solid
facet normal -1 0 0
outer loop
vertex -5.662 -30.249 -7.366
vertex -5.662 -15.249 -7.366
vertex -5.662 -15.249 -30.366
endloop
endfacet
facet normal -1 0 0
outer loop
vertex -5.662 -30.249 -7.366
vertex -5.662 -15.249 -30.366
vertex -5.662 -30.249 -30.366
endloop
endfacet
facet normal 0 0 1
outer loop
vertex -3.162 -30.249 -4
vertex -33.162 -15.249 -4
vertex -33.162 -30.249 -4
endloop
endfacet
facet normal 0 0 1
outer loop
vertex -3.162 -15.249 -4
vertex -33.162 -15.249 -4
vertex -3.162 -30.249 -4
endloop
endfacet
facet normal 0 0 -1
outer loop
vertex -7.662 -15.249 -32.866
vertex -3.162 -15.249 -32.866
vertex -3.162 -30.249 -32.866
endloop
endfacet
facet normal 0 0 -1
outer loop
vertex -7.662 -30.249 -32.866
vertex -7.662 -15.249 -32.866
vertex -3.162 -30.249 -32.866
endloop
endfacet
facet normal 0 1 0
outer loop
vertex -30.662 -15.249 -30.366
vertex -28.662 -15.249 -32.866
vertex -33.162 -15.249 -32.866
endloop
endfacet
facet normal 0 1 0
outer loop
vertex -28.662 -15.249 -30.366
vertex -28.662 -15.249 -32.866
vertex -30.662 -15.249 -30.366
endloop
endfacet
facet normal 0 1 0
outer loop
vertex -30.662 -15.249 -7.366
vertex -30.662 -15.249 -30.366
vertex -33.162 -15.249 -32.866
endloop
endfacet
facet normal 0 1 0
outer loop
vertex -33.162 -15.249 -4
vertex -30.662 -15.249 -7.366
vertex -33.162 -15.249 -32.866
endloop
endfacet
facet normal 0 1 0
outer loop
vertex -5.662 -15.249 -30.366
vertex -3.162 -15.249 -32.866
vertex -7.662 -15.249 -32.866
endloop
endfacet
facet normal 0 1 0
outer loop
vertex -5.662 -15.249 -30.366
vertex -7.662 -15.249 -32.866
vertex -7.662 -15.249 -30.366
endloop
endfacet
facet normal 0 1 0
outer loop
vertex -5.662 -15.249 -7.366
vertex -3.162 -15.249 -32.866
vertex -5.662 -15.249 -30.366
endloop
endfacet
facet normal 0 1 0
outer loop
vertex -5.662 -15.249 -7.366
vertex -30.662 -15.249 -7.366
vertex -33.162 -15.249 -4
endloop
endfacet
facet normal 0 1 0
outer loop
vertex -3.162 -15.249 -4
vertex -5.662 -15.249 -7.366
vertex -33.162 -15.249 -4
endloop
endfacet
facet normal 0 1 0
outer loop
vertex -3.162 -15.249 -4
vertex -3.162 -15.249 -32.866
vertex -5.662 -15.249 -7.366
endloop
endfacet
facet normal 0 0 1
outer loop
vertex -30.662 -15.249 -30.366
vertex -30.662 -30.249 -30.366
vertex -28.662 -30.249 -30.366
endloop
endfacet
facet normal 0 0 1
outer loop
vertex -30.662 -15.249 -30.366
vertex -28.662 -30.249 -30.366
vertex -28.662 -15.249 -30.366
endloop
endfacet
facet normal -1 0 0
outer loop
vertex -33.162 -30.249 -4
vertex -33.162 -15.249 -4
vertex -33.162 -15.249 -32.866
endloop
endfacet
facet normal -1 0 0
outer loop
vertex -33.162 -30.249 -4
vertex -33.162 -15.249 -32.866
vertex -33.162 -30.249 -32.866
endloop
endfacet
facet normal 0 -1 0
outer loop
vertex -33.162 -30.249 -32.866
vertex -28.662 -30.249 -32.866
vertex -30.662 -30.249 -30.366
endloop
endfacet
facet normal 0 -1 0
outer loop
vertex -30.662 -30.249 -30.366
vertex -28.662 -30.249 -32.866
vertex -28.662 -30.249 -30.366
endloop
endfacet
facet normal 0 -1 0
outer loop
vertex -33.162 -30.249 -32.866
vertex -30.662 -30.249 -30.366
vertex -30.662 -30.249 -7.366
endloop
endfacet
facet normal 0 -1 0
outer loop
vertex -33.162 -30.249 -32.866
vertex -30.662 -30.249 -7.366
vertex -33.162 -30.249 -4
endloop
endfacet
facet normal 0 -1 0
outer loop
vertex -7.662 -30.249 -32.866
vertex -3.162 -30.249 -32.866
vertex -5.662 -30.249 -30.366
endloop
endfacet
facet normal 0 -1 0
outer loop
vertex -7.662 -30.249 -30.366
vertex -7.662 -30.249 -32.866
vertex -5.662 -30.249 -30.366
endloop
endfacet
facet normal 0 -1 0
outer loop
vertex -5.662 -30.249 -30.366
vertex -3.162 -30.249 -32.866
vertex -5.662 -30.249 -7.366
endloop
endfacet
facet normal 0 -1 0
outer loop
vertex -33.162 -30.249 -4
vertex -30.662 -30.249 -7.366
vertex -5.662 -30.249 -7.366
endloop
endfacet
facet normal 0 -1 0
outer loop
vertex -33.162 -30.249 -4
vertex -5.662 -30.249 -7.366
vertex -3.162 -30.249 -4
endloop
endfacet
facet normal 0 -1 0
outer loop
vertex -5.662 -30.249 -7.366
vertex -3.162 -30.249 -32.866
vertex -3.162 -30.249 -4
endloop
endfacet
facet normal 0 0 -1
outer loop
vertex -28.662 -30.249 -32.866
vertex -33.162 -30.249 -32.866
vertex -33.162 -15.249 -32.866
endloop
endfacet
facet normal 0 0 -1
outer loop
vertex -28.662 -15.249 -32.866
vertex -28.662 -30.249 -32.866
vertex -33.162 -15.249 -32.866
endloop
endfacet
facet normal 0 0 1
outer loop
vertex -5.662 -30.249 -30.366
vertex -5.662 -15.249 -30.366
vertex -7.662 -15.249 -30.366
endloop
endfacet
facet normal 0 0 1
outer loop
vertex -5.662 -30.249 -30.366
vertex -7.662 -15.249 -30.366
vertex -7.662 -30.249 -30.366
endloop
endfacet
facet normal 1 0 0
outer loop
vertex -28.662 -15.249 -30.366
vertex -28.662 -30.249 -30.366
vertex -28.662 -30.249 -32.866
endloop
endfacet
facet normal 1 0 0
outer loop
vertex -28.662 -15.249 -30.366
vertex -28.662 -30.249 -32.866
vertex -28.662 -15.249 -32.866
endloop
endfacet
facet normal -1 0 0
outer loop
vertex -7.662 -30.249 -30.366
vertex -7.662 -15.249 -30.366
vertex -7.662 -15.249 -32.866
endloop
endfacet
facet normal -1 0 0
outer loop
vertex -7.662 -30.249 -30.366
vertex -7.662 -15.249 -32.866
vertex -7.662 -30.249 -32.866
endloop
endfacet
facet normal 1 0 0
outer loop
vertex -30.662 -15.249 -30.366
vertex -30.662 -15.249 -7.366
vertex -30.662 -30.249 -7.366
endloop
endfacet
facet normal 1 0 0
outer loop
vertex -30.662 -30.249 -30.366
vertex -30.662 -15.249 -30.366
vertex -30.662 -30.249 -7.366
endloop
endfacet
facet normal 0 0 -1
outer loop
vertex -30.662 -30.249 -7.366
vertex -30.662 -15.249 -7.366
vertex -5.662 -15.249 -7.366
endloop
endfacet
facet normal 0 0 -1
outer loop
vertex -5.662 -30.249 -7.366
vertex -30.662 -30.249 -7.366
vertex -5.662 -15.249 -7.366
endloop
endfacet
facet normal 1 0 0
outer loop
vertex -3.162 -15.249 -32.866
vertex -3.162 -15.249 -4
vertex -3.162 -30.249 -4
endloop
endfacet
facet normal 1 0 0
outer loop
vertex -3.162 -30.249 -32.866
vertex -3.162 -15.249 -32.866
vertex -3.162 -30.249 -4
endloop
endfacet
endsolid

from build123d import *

# Parameters (mm, degrees)
F0_W      = 35
F0_H      = 15
F1_DEPTH  = 7.366
F2_W      = 5
F2_H      = 15
F3_DEPTH  = 28
F4_W      = 5
F4_H      = 15
F5_DEPTH  = 28
F7_W      = 15
F7_H      = 5
F8_DEPTH  = 2
F6_W      = 15
F6_H      = 5
F9_DEPTH  = 2
F10_DEPTH = 4
F11_DEPTH = 2.5
F12_DEPTH = 2.5
F13_DEPTH = 2.5


with BuildPart() as f1:
    # F0 (on Top) → F1 (new body)
    with BuildSketch(Plane.XY):
        with Locations((-18.1619706172, -22.7490997307)):
            Rectangle(F0_W, F0_H)
    extrude(amount=-F1_DEPTH)

    # F2 (on face) → F3 (join)
    with BuildSketch(Plane(origin=(0, 0, -7.366), x_dir=(1, 0, 0), z_dir=(0, 0, -1))):
        with Locations((-33.1619706172, 22.7490997307)):
            Rectangle(F2_W, F2_H)
    extrude(amount=F3_DEPTH)

    # F4 (on face) → F5 (join)
    with BuildSketch(Plane(origin=(0, 0, -7.366), x_dir=(1, 0, 0), z_dir=(0, 0, -1))):
        with Locations((-3.1619706172, 22.7490997307)):
            Rectangle(F4_W, F4_H)
    extrude(amount=F5_DEPTH)

    # F7 (on face) → F8 (join)
    with BuildSketch(Plane.YZ.offset(-30.6619706172)):
        with Locations((-22.7490997307, -32.866)):
            Rectangle(F7_W, F7_H)
    extrude(amount=F8_DEPTH)

    # F6 (on face) → F9 (join)
    with BuildSketch(Plane(origin=(-5.6619706172, 0, 0), x_dir=(0, -1, 0), z_dir=(-1, 0, 0))):
        with Locations((22.7490997307, -32.866)):
            Rectangle(F6_W, F6_H)
    extrude(amount=F9_DEPTH)

    # F10 (cut): a face of the model
    f10_faces = [f1.faces().sort_by_distance(p)[0] for p in [
        (-18.1619706172, -22.7490997307, 0),
    ]]
    extrude(f10_faces, amount=-F10_DEPTH, mode=Mode.SUBTRACT)

    # F11 (cut): a face of the model
    f11_faces = [f1.faces().sort_by_distance(p)[0] for p in [
        (-0.6619706172, -22.7490997307, -19.683),
    ]]
    extrude(f11_faces, amount=-F11_DEPTH, mode=Mode.SUBTRACT)

    # F12 (cut): a face of the model
    f12_faces = [f1.faces().sort_by_distance(p)[0] for p in [
        (-35.6619706172, -22.7490997307, -19.683),
    ]]
    extrude(f12_faces, amount=-F12_DEPTH, mode=Mode.SUBTRACT)

    # F13 (cut): faces of the model
    f13_faces = [f1.faces().sort_by_distance(p)[0] for p in [
        (-30.9119706172, -22.7490997307, -35.366),
        (-5.4119706172, -22.7490997307, -35.366),
    ]]
    extrude(f13_faces, amount=-F13_DEPTH, mode=Mode.SUBTRACT)


solid = f1.part
